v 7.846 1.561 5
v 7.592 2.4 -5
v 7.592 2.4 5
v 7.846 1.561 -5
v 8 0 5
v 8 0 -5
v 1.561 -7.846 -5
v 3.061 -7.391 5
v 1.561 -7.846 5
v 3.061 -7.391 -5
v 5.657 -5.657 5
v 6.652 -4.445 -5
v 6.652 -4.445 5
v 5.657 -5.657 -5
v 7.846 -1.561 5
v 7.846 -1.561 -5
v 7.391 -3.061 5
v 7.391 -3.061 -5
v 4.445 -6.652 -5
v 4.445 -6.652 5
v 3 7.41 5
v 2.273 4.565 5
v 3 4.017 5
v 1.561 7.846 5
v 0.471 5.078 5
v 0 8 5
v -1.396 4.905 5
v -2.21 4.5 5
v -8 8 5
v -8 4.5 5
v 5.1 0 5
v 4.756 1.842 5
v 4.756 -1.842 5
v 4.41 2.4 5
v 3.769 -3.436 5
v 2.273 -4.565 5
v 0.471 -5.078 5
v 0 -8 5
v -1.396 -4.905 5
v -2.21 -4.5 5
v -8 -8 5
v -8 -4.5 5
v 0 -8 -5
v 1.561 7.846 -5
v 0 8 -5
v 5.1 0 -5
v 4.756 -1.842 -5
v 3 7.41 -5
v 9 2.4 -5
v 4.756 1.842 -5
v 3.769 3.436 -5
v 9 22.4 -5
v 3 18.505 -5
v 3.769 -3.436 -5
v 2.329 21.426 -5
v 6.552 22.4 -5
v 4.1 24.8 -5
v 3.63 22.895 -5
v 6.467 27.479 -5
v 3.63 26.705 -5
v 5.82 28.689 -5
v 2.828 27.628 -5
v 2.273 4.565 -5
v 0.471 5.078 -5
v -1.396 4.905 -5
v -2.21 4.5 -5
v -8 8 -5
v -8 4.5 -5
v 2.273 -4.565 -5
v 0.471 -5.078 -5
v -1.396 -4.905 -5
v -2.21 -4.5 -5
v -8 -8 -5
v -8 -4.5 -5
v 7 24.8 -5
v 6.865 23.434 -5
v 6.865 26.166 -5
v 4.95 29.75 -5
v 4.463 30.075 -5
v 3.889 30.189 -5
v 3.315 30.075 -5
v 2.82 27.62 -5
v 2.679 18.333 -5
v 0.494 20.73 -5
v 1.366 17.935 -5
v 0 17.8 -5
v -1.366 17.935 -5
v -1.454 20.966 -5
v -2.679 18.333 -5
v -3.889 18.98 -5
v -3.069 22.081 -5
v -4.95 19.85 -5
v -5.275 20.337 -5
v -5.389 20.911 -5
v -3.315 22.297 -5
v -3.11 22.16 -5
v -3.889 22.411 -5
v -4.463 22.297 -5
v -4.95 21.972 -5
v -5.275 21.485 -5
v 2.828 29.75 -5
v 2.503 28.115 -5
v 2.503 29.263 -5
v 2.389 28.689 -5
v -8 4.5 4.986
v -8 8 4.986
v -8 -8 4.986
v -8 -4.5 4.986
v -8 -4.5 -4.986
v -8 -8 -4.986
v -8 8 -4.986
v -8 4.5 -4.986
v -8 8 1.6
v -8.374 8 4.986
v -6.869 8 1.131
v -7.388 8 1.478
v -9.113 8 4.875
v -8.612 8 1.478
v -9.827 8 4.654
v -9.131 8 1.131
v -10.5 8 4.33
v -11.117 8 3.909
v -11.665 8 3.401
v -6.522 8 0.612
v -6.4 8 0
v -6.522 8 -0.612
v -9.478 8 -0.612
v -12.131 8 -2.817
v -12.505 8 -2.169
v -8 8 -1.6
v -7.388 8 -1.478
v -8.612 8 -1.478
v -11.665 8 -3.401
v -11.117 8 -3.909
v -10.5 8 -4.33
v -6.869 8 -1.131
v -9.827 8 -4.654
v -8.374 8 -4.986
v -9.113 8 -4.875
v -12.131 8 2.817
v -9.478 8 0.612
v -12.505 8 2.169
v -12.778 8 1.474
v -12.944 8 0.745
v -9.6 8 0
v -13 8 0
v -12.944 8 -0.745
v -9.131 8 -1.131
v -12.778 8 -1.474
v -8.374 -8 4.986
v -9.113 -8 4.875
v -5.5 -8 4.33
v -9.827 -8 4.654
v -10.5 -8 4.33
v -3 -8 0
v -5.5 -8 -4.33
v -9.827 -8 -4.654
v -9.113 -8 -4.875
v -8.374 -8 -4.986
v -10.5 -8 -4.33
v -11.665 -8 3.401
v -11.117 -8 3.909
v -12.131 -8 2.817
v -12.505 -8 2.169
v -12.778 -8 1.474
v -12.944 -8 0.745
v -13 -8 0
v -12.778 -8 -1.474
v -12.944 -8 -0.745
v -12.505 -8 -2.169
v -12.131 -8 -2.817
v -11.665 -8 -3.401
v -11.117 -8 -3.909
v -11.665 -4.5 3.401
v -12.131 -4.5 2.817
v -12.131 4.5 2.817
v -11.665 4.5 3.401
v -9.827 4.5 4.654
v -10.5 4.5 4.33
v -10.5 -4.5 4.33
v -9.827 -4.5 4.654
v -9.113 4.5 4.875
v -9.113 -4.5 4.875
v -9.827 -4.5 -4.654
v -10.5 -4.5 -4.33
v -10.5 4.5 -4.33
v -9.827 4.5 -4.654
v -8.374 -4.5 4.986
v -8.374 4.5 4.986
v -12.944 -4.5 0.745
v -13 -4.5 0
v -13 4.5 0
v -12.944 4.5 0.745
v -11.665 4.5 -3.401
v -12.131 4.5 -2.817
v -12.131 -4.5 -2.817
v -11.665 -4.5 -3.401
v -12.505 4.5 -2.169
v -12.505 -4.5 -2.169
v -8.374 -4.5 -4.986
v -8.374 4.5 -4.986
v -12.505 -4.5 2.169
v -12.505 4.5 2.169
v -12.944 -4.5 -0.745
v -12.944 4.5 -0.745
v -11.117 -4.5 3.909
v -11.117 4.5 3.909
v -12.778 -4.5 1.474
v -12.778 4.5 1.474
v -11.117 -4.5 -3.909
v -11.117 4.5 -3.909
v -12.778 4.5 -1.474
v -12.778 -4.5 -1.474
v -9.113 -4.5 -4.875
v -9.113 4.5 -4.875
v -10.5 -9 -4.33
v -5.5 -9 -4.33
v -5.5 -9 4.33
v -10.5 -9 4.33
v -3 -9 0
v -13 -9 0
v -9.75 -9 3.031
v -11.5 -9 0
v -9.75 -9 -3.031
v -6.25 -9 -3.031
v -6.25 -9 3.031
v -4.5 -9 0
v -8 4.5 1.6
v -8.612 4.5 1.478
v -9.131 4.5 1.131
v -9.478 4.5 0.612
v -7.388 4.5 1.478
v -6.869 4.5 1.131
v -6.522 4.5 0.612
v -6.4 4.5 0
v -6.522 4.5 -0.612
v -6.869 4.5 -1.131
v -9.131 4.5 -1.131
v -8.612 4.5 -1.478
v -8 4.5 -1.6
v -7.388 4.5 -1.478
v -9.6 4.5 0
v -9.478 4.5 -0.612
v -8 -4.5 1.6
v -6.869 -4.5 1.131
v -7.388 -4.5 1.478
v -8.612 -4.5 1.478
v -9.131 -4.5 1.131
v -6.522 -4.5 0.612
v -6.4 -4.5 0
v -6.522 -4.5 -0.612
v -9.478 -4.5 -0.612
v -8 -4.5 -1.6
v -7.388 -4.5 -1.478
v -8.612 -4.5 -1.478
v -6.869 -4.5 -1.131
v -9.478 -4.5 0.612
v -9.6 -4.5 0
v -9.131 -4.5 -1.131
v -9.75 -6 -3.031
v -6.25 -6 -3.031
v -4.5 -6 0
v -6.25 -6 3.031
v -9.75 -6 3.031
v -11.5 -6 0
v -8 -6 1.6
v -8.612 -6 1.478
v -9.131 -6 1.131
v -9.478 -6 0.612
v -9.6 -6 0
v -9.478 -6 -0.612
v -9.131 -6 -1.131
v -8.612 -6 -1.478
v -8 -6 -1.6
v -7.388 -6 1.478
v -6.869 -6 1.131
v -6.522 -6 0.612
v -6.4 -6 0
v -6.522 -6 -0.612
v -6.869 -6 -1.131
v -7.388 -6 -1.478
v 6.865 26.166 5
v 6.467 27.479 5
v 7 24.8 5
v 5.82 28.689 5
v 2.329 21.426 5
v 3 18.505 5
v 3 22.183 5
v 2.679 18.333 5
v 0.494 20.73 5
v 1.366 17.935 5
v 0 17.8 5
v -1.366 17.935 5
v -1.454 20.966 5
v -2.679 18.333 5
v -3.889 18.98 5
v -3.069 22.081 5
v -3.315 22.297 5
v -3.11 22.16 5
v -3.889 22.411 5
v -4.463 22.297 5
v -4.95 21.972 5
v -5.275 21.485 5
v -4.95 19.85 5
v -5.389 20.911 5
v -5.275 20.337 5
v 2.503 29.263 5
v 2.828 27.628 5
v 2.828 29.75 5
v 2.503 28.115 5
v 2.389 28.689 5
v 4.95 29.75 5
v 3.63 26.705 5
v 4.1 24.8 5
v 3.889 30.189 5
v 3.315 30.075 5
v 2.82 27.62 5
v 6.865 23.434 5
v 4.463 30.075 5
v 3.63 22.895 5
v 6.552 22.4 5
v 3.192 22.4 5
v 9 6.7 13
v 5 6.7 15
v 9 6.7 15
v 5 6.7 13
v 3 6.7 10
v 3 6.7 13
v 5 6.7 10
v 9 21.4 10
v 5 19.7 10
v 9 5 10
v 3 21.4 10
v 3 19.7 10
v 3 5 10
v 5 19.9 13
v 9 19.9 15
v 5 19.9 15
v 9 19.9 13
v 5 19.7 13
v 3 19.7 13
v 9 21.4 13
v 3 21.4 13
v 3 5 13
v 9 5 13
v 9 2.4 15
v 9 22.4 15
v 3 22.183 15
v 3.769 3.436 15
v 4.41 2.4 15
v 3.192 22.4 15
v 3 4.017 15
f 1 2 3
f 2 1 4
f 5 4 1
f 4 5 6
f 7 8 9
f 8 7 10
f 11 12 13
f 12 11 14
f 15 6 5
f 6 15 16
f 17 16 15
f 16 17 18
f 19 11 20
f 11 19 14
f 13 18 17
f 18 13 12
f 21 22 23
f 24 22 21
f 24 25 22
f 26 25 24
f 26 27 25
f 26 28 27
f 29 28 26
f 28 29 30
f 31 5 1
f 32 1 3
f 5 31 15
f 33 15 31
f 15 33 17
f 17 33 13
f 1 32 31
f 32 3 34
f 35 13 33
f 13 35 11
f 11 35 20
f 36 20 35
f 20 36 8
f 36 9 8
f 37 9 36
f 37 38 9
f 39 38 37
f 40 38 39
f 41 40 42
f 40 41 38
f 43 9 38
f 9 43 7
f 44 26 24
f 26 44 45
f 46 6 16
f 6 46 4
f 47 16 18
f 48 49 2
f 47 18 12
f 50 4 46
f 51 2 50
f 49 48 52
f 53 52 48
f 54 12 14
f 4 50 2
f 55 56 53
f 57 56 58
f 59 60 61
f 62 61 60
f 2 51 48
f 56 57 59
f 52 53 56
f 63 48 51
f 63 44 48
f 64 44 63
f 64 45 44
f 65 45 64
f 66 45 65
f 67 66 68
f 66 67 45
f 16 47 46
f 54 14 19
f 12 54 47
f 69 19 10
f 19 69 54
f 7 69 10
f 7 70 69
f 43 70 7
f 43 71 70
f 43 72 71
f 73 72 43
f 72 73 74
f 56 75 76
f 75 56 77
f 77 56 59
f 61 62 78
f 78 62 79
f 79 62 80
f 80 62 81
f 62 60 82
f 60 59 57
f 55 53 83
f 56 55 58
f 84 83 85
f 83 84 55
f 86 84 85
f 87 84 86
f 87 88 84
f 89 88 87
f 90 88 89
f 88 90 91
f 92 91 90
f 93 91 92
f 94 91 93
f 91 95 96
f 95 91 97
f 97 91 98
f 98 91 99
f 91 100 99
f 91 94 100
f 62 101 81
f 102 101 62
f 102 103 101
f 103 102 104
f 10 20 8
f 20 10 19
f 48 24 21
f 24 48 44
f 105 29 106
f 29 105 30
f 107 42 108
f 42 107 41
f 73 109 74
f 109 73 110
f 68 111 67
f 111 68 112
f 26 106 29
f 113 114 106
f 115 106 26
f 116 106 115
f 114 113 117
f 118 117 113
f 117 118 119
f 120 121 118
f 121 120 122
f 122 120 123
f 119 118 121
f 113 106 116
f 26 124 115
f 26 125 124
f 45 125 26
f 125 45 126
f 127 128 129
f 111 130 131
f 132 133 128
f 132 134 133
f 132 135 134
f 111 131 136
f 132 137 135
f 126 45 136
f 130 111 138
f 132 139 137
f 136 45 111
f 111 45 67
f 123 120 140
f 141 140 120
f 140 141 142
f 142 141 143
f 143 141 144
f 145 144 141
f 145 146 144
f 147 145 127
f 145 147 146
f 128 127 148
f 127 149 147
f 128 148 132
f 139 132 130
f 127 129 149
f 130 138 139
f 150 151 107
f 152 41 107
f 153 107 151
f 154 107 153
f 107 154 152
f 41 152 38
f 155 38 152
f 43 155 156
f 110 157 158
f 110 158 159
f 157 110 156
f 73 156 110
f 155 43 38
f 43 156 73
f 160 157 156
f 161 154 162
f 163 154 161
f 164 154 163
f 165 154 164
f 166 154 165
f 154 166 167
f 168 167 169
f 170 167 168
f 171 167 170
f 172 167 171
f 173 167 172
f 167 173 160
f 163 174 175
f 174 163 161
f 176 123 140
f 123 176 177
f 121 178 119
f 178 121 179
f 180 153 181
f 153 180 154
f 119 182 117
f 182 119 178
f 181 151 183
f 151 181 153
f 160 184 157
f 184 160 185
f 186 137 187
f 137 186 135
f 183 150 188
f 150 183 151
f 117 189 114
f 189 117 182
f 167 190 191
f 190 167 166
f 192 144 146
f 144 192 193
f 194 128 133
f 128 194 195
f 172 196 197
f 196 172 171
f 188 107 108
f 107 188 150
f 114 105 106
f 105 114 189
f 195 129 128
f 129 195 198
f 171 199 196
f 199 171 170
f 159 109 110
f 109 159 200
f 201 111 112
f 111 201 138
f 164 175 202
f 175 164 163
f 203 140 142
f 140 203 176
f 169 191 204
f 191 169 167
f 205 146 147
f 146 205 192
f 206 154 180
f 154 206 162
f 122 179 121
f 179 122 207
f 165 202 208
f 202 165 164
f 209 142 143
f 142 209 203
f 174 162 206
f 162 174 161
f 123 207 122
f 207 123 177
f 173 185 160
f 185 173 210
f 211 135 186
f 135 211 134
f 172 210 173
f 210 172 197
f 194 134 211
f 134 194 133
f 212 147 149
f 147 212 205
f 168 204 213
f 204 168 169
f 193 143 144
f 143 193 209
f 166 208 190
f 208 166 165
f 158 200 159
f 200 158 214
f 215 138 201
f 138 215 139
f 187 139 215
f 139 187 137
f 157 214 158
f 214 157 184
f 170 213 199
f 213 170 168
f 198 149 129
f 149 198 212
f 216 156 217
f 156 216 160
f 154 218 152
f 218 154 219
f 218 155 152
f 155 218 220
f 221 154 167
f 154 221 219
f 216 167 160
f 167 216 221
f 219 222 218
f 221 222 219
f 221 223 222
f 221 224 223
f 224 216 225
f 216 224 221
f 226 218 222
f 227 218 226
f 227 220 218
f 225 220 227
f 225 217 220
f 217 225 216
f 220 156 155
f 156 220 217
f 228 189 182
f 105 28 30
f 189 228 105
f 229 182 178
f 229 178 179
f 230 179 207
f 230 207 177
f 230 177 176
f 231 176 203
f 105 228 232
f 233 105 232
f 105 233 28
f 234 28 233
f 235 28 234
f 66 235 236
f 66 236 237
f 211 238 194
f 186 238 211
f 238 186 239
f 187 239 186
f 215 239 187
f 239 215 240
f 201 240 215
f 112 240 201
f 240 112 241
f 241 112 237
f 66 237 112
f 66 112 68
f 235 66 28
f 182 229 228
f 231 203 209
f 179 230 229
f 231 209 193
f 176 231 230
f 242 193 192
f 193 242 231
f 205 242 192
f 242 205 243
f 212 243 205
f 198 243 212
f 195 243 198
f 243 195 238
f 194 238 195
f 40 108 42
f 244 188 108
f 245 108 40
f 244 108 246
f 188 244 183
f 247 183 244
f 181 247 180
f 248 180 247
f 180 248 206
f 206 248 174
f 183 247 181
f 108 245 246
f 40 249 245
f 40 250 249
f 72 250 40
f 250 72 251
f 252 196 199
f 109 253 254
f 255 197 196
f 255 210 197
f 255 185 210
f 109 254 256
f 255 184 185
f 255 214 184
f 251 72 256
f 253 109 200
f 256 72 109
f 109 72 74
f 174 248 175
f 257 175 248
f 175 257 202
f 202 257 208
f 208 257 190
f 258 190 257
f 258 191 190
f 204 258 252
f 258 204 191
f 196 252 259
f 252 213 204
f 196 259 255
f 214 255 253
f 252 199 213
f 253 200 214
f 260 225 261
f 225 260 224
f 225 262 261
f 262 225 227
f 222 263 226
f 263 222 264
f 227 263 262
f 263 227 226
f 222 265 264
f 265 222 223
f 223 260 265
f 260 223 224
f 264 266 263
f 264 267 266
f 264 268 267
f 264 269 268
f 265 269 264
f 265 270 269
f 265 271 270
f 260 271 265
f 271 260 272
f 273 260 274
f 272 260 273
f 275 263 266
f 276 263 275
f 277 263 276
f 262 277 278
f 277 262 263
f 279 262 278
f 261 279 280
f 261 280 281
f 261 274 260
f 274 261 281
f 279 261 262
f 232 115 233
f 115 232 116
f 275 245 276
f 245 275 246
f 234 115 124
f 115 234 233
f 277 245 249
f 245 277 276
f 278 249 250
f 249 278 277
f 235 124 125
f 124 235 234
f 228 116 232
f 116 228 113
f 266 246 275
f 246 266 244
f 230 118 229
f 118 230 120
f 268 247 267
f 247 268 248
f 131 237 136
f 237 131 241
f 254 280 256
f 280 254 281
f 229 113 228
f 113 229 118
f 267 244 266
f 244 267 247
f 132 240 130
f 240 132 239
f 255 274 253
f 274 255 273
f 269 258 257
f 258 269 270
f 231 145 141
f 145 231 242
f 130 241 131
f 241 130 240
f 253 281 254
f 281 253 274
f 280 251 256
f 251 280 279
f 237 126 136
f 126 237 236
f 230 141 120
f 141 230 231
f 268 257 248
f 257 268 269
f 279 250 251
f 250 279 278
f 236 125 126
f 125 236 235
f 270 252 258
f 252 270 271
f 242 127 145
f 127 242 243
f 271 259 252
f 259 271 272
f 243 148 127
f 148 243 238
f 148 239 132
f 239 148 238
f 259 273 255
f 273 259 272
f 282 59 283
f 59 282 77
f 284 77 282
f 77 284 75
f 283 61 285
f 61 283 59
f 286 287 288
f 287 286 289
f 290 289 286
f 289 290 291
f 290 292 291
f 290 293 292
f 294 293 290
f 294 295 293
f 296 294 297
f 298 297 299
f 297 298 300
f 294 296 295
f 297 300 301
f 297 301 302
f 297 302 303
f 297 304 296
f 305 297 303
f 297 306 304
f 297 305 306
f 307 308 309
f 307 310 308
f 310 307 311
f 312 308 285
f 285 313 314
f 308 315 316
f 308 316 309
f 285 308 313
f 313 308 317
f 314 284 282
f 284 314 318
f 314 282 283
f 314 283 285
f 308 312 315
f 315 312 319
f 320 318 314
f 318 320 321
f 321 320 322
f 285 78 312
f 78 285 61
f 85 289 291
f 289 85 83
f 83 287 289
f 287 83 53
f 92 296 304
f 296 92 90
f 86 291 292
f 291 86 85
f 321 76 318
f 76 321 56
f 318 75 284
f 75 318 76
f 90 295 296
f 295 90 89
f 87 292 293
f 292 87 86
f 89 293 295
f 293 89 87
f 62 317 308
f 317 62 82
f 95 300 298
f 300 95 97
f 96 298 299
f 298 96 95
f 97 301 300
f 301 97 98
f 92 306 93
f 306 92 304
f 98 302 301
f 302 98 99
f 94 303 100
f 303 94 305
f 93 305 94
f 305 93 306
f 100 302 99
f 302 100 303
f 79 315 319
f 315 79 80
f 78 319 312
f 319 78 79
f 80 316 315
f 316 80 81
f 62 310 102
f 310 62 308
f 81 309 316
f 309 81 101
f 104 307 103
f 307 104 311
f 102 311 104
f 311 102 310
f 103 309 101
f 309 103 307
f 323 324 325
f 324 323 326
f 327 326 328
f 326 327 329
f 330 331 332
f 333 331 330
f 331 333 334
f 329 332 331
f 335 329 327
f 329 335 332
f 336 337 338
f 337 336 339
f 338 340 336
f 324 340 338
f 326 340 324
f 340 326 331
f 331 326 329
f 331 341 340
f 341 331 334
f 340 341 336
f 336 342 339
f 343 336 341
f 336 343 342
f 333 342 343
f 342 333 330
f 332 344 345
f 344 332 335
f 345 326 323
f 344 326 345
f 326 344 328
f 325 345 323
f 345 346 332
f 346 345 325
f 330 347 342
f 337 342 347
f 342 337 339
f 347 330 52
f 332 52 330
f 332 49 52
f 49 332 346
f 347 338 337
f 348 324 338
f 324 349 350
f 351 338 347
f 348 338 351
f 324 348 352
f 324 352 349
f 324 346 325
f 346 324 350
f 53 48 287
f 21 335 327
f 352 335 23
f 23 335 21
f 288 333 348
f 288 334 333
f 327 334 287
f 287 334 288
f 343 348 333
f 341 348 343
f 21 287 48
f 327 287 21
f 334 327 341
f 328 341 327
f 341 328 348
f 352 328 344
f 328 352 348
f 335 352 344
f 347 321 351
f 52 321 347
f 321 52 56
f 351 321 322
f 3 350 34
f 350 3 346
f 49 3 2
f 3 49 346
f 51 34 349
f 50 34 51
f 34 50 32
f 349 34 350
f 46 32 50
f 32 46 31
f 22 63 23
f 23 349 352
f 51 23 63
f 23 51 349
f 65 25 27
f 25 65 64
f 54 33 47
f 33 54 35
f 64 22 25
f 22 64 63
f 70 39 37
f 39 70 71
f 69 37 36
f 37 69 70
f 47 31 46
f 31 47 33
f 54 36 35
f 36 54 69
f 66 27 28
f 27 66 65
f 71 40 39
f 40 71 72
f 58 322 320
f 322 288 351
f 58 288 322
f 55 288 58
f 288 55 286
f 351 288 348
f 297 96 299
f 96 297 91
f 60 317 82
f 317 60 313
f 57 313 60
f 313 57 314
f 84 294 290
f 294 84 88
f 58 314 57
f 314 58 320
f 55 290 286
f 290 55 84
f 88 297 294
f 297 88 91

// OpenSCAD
// ePoxi's Mechanical Y-Endstop Mount for Prusa i3
// 24-Feb-2014
// GNU GPL v3
// poxirave@gmail.com

RodDistance = 24.8;

module m10rod(){
	difference(){
		union() {
			cylinder(r=16/2, h=10, center=true, $fn=32);
			translate([-16/4,0,0]) cube(size=[16/2, 16, 10], center=true);
			translate([-16/2,0,0]) rotate([90, 0, 0]) cylinder(r=5, h=16, center=true, $fn=42);
			translate([-16/2,-1,0]) rotate([90, 0, 0]) cylinder(r=5, h=16, center=true, $fn=6);
		}
		translate([-10,0,0]) cube(size=[20, 9, 11], center=true);
		translate([-16/2,-14,0]) rotate([90, 0, 0]) cylinder(r=3.5, h=16, center=true, $fn=6);
		translate([-16/2,0,0]) rotate([90, 0, 0]) cylinder(r=1.6, h=18, center=true, $fn=16);

	}
}


module m8rod(){
	union() {
		difference(){
			cylinder(r=14/2, h=10, center=true, $fn=32);
			rotate([0,0,45]) translate([0, 4, 0]) cube(size=[20, 8, 15], center=true);
		}
		rotate([0,0,45]) translate([-11/2,0,0]) cylinder(r=1.5, h=10, center=true, $fn=16);
		rotate([0,0,45]) translate([11/2,0,0]) cylinder(r=1.5, h=10, center=true, $fn=16);
	}
}

module SwitchCutout() {
	// Switch
	translate([-15, 2, 4]) cube([13.2, 5.9, 10]);

	// tie holes
	translate([-16.5, -3.5, 4]) cube([1.7, 10, 3]);
	translate([-15+13.2, -3.5, 4]) cube([1.7, 10, 3]);
}

module MSwitchMount(){
	difference() {
		translate([2,0,5]) cube(size=[6, 20, 20], center=true);
		translate([-1, -7.5, 6]) rotate([0, 0, -90]) SwitchCutout();	
	}
}

module yEndstop(){
	union(){
		difference(){
			union() {
				m10rod();
				translate([0, RodDistance, 0]) m8rod();
				translate([4, RodDistance/2, 0]) MSwitchMount();
			}
			cylinder(r=5+0.1, h=50, center=true);
			translate([0, RodDistance, 0]) cylinder(r=4+0.1, h=50, center=true);
		}
	}
}


yEndstop();

//mirror() yEndstop();
